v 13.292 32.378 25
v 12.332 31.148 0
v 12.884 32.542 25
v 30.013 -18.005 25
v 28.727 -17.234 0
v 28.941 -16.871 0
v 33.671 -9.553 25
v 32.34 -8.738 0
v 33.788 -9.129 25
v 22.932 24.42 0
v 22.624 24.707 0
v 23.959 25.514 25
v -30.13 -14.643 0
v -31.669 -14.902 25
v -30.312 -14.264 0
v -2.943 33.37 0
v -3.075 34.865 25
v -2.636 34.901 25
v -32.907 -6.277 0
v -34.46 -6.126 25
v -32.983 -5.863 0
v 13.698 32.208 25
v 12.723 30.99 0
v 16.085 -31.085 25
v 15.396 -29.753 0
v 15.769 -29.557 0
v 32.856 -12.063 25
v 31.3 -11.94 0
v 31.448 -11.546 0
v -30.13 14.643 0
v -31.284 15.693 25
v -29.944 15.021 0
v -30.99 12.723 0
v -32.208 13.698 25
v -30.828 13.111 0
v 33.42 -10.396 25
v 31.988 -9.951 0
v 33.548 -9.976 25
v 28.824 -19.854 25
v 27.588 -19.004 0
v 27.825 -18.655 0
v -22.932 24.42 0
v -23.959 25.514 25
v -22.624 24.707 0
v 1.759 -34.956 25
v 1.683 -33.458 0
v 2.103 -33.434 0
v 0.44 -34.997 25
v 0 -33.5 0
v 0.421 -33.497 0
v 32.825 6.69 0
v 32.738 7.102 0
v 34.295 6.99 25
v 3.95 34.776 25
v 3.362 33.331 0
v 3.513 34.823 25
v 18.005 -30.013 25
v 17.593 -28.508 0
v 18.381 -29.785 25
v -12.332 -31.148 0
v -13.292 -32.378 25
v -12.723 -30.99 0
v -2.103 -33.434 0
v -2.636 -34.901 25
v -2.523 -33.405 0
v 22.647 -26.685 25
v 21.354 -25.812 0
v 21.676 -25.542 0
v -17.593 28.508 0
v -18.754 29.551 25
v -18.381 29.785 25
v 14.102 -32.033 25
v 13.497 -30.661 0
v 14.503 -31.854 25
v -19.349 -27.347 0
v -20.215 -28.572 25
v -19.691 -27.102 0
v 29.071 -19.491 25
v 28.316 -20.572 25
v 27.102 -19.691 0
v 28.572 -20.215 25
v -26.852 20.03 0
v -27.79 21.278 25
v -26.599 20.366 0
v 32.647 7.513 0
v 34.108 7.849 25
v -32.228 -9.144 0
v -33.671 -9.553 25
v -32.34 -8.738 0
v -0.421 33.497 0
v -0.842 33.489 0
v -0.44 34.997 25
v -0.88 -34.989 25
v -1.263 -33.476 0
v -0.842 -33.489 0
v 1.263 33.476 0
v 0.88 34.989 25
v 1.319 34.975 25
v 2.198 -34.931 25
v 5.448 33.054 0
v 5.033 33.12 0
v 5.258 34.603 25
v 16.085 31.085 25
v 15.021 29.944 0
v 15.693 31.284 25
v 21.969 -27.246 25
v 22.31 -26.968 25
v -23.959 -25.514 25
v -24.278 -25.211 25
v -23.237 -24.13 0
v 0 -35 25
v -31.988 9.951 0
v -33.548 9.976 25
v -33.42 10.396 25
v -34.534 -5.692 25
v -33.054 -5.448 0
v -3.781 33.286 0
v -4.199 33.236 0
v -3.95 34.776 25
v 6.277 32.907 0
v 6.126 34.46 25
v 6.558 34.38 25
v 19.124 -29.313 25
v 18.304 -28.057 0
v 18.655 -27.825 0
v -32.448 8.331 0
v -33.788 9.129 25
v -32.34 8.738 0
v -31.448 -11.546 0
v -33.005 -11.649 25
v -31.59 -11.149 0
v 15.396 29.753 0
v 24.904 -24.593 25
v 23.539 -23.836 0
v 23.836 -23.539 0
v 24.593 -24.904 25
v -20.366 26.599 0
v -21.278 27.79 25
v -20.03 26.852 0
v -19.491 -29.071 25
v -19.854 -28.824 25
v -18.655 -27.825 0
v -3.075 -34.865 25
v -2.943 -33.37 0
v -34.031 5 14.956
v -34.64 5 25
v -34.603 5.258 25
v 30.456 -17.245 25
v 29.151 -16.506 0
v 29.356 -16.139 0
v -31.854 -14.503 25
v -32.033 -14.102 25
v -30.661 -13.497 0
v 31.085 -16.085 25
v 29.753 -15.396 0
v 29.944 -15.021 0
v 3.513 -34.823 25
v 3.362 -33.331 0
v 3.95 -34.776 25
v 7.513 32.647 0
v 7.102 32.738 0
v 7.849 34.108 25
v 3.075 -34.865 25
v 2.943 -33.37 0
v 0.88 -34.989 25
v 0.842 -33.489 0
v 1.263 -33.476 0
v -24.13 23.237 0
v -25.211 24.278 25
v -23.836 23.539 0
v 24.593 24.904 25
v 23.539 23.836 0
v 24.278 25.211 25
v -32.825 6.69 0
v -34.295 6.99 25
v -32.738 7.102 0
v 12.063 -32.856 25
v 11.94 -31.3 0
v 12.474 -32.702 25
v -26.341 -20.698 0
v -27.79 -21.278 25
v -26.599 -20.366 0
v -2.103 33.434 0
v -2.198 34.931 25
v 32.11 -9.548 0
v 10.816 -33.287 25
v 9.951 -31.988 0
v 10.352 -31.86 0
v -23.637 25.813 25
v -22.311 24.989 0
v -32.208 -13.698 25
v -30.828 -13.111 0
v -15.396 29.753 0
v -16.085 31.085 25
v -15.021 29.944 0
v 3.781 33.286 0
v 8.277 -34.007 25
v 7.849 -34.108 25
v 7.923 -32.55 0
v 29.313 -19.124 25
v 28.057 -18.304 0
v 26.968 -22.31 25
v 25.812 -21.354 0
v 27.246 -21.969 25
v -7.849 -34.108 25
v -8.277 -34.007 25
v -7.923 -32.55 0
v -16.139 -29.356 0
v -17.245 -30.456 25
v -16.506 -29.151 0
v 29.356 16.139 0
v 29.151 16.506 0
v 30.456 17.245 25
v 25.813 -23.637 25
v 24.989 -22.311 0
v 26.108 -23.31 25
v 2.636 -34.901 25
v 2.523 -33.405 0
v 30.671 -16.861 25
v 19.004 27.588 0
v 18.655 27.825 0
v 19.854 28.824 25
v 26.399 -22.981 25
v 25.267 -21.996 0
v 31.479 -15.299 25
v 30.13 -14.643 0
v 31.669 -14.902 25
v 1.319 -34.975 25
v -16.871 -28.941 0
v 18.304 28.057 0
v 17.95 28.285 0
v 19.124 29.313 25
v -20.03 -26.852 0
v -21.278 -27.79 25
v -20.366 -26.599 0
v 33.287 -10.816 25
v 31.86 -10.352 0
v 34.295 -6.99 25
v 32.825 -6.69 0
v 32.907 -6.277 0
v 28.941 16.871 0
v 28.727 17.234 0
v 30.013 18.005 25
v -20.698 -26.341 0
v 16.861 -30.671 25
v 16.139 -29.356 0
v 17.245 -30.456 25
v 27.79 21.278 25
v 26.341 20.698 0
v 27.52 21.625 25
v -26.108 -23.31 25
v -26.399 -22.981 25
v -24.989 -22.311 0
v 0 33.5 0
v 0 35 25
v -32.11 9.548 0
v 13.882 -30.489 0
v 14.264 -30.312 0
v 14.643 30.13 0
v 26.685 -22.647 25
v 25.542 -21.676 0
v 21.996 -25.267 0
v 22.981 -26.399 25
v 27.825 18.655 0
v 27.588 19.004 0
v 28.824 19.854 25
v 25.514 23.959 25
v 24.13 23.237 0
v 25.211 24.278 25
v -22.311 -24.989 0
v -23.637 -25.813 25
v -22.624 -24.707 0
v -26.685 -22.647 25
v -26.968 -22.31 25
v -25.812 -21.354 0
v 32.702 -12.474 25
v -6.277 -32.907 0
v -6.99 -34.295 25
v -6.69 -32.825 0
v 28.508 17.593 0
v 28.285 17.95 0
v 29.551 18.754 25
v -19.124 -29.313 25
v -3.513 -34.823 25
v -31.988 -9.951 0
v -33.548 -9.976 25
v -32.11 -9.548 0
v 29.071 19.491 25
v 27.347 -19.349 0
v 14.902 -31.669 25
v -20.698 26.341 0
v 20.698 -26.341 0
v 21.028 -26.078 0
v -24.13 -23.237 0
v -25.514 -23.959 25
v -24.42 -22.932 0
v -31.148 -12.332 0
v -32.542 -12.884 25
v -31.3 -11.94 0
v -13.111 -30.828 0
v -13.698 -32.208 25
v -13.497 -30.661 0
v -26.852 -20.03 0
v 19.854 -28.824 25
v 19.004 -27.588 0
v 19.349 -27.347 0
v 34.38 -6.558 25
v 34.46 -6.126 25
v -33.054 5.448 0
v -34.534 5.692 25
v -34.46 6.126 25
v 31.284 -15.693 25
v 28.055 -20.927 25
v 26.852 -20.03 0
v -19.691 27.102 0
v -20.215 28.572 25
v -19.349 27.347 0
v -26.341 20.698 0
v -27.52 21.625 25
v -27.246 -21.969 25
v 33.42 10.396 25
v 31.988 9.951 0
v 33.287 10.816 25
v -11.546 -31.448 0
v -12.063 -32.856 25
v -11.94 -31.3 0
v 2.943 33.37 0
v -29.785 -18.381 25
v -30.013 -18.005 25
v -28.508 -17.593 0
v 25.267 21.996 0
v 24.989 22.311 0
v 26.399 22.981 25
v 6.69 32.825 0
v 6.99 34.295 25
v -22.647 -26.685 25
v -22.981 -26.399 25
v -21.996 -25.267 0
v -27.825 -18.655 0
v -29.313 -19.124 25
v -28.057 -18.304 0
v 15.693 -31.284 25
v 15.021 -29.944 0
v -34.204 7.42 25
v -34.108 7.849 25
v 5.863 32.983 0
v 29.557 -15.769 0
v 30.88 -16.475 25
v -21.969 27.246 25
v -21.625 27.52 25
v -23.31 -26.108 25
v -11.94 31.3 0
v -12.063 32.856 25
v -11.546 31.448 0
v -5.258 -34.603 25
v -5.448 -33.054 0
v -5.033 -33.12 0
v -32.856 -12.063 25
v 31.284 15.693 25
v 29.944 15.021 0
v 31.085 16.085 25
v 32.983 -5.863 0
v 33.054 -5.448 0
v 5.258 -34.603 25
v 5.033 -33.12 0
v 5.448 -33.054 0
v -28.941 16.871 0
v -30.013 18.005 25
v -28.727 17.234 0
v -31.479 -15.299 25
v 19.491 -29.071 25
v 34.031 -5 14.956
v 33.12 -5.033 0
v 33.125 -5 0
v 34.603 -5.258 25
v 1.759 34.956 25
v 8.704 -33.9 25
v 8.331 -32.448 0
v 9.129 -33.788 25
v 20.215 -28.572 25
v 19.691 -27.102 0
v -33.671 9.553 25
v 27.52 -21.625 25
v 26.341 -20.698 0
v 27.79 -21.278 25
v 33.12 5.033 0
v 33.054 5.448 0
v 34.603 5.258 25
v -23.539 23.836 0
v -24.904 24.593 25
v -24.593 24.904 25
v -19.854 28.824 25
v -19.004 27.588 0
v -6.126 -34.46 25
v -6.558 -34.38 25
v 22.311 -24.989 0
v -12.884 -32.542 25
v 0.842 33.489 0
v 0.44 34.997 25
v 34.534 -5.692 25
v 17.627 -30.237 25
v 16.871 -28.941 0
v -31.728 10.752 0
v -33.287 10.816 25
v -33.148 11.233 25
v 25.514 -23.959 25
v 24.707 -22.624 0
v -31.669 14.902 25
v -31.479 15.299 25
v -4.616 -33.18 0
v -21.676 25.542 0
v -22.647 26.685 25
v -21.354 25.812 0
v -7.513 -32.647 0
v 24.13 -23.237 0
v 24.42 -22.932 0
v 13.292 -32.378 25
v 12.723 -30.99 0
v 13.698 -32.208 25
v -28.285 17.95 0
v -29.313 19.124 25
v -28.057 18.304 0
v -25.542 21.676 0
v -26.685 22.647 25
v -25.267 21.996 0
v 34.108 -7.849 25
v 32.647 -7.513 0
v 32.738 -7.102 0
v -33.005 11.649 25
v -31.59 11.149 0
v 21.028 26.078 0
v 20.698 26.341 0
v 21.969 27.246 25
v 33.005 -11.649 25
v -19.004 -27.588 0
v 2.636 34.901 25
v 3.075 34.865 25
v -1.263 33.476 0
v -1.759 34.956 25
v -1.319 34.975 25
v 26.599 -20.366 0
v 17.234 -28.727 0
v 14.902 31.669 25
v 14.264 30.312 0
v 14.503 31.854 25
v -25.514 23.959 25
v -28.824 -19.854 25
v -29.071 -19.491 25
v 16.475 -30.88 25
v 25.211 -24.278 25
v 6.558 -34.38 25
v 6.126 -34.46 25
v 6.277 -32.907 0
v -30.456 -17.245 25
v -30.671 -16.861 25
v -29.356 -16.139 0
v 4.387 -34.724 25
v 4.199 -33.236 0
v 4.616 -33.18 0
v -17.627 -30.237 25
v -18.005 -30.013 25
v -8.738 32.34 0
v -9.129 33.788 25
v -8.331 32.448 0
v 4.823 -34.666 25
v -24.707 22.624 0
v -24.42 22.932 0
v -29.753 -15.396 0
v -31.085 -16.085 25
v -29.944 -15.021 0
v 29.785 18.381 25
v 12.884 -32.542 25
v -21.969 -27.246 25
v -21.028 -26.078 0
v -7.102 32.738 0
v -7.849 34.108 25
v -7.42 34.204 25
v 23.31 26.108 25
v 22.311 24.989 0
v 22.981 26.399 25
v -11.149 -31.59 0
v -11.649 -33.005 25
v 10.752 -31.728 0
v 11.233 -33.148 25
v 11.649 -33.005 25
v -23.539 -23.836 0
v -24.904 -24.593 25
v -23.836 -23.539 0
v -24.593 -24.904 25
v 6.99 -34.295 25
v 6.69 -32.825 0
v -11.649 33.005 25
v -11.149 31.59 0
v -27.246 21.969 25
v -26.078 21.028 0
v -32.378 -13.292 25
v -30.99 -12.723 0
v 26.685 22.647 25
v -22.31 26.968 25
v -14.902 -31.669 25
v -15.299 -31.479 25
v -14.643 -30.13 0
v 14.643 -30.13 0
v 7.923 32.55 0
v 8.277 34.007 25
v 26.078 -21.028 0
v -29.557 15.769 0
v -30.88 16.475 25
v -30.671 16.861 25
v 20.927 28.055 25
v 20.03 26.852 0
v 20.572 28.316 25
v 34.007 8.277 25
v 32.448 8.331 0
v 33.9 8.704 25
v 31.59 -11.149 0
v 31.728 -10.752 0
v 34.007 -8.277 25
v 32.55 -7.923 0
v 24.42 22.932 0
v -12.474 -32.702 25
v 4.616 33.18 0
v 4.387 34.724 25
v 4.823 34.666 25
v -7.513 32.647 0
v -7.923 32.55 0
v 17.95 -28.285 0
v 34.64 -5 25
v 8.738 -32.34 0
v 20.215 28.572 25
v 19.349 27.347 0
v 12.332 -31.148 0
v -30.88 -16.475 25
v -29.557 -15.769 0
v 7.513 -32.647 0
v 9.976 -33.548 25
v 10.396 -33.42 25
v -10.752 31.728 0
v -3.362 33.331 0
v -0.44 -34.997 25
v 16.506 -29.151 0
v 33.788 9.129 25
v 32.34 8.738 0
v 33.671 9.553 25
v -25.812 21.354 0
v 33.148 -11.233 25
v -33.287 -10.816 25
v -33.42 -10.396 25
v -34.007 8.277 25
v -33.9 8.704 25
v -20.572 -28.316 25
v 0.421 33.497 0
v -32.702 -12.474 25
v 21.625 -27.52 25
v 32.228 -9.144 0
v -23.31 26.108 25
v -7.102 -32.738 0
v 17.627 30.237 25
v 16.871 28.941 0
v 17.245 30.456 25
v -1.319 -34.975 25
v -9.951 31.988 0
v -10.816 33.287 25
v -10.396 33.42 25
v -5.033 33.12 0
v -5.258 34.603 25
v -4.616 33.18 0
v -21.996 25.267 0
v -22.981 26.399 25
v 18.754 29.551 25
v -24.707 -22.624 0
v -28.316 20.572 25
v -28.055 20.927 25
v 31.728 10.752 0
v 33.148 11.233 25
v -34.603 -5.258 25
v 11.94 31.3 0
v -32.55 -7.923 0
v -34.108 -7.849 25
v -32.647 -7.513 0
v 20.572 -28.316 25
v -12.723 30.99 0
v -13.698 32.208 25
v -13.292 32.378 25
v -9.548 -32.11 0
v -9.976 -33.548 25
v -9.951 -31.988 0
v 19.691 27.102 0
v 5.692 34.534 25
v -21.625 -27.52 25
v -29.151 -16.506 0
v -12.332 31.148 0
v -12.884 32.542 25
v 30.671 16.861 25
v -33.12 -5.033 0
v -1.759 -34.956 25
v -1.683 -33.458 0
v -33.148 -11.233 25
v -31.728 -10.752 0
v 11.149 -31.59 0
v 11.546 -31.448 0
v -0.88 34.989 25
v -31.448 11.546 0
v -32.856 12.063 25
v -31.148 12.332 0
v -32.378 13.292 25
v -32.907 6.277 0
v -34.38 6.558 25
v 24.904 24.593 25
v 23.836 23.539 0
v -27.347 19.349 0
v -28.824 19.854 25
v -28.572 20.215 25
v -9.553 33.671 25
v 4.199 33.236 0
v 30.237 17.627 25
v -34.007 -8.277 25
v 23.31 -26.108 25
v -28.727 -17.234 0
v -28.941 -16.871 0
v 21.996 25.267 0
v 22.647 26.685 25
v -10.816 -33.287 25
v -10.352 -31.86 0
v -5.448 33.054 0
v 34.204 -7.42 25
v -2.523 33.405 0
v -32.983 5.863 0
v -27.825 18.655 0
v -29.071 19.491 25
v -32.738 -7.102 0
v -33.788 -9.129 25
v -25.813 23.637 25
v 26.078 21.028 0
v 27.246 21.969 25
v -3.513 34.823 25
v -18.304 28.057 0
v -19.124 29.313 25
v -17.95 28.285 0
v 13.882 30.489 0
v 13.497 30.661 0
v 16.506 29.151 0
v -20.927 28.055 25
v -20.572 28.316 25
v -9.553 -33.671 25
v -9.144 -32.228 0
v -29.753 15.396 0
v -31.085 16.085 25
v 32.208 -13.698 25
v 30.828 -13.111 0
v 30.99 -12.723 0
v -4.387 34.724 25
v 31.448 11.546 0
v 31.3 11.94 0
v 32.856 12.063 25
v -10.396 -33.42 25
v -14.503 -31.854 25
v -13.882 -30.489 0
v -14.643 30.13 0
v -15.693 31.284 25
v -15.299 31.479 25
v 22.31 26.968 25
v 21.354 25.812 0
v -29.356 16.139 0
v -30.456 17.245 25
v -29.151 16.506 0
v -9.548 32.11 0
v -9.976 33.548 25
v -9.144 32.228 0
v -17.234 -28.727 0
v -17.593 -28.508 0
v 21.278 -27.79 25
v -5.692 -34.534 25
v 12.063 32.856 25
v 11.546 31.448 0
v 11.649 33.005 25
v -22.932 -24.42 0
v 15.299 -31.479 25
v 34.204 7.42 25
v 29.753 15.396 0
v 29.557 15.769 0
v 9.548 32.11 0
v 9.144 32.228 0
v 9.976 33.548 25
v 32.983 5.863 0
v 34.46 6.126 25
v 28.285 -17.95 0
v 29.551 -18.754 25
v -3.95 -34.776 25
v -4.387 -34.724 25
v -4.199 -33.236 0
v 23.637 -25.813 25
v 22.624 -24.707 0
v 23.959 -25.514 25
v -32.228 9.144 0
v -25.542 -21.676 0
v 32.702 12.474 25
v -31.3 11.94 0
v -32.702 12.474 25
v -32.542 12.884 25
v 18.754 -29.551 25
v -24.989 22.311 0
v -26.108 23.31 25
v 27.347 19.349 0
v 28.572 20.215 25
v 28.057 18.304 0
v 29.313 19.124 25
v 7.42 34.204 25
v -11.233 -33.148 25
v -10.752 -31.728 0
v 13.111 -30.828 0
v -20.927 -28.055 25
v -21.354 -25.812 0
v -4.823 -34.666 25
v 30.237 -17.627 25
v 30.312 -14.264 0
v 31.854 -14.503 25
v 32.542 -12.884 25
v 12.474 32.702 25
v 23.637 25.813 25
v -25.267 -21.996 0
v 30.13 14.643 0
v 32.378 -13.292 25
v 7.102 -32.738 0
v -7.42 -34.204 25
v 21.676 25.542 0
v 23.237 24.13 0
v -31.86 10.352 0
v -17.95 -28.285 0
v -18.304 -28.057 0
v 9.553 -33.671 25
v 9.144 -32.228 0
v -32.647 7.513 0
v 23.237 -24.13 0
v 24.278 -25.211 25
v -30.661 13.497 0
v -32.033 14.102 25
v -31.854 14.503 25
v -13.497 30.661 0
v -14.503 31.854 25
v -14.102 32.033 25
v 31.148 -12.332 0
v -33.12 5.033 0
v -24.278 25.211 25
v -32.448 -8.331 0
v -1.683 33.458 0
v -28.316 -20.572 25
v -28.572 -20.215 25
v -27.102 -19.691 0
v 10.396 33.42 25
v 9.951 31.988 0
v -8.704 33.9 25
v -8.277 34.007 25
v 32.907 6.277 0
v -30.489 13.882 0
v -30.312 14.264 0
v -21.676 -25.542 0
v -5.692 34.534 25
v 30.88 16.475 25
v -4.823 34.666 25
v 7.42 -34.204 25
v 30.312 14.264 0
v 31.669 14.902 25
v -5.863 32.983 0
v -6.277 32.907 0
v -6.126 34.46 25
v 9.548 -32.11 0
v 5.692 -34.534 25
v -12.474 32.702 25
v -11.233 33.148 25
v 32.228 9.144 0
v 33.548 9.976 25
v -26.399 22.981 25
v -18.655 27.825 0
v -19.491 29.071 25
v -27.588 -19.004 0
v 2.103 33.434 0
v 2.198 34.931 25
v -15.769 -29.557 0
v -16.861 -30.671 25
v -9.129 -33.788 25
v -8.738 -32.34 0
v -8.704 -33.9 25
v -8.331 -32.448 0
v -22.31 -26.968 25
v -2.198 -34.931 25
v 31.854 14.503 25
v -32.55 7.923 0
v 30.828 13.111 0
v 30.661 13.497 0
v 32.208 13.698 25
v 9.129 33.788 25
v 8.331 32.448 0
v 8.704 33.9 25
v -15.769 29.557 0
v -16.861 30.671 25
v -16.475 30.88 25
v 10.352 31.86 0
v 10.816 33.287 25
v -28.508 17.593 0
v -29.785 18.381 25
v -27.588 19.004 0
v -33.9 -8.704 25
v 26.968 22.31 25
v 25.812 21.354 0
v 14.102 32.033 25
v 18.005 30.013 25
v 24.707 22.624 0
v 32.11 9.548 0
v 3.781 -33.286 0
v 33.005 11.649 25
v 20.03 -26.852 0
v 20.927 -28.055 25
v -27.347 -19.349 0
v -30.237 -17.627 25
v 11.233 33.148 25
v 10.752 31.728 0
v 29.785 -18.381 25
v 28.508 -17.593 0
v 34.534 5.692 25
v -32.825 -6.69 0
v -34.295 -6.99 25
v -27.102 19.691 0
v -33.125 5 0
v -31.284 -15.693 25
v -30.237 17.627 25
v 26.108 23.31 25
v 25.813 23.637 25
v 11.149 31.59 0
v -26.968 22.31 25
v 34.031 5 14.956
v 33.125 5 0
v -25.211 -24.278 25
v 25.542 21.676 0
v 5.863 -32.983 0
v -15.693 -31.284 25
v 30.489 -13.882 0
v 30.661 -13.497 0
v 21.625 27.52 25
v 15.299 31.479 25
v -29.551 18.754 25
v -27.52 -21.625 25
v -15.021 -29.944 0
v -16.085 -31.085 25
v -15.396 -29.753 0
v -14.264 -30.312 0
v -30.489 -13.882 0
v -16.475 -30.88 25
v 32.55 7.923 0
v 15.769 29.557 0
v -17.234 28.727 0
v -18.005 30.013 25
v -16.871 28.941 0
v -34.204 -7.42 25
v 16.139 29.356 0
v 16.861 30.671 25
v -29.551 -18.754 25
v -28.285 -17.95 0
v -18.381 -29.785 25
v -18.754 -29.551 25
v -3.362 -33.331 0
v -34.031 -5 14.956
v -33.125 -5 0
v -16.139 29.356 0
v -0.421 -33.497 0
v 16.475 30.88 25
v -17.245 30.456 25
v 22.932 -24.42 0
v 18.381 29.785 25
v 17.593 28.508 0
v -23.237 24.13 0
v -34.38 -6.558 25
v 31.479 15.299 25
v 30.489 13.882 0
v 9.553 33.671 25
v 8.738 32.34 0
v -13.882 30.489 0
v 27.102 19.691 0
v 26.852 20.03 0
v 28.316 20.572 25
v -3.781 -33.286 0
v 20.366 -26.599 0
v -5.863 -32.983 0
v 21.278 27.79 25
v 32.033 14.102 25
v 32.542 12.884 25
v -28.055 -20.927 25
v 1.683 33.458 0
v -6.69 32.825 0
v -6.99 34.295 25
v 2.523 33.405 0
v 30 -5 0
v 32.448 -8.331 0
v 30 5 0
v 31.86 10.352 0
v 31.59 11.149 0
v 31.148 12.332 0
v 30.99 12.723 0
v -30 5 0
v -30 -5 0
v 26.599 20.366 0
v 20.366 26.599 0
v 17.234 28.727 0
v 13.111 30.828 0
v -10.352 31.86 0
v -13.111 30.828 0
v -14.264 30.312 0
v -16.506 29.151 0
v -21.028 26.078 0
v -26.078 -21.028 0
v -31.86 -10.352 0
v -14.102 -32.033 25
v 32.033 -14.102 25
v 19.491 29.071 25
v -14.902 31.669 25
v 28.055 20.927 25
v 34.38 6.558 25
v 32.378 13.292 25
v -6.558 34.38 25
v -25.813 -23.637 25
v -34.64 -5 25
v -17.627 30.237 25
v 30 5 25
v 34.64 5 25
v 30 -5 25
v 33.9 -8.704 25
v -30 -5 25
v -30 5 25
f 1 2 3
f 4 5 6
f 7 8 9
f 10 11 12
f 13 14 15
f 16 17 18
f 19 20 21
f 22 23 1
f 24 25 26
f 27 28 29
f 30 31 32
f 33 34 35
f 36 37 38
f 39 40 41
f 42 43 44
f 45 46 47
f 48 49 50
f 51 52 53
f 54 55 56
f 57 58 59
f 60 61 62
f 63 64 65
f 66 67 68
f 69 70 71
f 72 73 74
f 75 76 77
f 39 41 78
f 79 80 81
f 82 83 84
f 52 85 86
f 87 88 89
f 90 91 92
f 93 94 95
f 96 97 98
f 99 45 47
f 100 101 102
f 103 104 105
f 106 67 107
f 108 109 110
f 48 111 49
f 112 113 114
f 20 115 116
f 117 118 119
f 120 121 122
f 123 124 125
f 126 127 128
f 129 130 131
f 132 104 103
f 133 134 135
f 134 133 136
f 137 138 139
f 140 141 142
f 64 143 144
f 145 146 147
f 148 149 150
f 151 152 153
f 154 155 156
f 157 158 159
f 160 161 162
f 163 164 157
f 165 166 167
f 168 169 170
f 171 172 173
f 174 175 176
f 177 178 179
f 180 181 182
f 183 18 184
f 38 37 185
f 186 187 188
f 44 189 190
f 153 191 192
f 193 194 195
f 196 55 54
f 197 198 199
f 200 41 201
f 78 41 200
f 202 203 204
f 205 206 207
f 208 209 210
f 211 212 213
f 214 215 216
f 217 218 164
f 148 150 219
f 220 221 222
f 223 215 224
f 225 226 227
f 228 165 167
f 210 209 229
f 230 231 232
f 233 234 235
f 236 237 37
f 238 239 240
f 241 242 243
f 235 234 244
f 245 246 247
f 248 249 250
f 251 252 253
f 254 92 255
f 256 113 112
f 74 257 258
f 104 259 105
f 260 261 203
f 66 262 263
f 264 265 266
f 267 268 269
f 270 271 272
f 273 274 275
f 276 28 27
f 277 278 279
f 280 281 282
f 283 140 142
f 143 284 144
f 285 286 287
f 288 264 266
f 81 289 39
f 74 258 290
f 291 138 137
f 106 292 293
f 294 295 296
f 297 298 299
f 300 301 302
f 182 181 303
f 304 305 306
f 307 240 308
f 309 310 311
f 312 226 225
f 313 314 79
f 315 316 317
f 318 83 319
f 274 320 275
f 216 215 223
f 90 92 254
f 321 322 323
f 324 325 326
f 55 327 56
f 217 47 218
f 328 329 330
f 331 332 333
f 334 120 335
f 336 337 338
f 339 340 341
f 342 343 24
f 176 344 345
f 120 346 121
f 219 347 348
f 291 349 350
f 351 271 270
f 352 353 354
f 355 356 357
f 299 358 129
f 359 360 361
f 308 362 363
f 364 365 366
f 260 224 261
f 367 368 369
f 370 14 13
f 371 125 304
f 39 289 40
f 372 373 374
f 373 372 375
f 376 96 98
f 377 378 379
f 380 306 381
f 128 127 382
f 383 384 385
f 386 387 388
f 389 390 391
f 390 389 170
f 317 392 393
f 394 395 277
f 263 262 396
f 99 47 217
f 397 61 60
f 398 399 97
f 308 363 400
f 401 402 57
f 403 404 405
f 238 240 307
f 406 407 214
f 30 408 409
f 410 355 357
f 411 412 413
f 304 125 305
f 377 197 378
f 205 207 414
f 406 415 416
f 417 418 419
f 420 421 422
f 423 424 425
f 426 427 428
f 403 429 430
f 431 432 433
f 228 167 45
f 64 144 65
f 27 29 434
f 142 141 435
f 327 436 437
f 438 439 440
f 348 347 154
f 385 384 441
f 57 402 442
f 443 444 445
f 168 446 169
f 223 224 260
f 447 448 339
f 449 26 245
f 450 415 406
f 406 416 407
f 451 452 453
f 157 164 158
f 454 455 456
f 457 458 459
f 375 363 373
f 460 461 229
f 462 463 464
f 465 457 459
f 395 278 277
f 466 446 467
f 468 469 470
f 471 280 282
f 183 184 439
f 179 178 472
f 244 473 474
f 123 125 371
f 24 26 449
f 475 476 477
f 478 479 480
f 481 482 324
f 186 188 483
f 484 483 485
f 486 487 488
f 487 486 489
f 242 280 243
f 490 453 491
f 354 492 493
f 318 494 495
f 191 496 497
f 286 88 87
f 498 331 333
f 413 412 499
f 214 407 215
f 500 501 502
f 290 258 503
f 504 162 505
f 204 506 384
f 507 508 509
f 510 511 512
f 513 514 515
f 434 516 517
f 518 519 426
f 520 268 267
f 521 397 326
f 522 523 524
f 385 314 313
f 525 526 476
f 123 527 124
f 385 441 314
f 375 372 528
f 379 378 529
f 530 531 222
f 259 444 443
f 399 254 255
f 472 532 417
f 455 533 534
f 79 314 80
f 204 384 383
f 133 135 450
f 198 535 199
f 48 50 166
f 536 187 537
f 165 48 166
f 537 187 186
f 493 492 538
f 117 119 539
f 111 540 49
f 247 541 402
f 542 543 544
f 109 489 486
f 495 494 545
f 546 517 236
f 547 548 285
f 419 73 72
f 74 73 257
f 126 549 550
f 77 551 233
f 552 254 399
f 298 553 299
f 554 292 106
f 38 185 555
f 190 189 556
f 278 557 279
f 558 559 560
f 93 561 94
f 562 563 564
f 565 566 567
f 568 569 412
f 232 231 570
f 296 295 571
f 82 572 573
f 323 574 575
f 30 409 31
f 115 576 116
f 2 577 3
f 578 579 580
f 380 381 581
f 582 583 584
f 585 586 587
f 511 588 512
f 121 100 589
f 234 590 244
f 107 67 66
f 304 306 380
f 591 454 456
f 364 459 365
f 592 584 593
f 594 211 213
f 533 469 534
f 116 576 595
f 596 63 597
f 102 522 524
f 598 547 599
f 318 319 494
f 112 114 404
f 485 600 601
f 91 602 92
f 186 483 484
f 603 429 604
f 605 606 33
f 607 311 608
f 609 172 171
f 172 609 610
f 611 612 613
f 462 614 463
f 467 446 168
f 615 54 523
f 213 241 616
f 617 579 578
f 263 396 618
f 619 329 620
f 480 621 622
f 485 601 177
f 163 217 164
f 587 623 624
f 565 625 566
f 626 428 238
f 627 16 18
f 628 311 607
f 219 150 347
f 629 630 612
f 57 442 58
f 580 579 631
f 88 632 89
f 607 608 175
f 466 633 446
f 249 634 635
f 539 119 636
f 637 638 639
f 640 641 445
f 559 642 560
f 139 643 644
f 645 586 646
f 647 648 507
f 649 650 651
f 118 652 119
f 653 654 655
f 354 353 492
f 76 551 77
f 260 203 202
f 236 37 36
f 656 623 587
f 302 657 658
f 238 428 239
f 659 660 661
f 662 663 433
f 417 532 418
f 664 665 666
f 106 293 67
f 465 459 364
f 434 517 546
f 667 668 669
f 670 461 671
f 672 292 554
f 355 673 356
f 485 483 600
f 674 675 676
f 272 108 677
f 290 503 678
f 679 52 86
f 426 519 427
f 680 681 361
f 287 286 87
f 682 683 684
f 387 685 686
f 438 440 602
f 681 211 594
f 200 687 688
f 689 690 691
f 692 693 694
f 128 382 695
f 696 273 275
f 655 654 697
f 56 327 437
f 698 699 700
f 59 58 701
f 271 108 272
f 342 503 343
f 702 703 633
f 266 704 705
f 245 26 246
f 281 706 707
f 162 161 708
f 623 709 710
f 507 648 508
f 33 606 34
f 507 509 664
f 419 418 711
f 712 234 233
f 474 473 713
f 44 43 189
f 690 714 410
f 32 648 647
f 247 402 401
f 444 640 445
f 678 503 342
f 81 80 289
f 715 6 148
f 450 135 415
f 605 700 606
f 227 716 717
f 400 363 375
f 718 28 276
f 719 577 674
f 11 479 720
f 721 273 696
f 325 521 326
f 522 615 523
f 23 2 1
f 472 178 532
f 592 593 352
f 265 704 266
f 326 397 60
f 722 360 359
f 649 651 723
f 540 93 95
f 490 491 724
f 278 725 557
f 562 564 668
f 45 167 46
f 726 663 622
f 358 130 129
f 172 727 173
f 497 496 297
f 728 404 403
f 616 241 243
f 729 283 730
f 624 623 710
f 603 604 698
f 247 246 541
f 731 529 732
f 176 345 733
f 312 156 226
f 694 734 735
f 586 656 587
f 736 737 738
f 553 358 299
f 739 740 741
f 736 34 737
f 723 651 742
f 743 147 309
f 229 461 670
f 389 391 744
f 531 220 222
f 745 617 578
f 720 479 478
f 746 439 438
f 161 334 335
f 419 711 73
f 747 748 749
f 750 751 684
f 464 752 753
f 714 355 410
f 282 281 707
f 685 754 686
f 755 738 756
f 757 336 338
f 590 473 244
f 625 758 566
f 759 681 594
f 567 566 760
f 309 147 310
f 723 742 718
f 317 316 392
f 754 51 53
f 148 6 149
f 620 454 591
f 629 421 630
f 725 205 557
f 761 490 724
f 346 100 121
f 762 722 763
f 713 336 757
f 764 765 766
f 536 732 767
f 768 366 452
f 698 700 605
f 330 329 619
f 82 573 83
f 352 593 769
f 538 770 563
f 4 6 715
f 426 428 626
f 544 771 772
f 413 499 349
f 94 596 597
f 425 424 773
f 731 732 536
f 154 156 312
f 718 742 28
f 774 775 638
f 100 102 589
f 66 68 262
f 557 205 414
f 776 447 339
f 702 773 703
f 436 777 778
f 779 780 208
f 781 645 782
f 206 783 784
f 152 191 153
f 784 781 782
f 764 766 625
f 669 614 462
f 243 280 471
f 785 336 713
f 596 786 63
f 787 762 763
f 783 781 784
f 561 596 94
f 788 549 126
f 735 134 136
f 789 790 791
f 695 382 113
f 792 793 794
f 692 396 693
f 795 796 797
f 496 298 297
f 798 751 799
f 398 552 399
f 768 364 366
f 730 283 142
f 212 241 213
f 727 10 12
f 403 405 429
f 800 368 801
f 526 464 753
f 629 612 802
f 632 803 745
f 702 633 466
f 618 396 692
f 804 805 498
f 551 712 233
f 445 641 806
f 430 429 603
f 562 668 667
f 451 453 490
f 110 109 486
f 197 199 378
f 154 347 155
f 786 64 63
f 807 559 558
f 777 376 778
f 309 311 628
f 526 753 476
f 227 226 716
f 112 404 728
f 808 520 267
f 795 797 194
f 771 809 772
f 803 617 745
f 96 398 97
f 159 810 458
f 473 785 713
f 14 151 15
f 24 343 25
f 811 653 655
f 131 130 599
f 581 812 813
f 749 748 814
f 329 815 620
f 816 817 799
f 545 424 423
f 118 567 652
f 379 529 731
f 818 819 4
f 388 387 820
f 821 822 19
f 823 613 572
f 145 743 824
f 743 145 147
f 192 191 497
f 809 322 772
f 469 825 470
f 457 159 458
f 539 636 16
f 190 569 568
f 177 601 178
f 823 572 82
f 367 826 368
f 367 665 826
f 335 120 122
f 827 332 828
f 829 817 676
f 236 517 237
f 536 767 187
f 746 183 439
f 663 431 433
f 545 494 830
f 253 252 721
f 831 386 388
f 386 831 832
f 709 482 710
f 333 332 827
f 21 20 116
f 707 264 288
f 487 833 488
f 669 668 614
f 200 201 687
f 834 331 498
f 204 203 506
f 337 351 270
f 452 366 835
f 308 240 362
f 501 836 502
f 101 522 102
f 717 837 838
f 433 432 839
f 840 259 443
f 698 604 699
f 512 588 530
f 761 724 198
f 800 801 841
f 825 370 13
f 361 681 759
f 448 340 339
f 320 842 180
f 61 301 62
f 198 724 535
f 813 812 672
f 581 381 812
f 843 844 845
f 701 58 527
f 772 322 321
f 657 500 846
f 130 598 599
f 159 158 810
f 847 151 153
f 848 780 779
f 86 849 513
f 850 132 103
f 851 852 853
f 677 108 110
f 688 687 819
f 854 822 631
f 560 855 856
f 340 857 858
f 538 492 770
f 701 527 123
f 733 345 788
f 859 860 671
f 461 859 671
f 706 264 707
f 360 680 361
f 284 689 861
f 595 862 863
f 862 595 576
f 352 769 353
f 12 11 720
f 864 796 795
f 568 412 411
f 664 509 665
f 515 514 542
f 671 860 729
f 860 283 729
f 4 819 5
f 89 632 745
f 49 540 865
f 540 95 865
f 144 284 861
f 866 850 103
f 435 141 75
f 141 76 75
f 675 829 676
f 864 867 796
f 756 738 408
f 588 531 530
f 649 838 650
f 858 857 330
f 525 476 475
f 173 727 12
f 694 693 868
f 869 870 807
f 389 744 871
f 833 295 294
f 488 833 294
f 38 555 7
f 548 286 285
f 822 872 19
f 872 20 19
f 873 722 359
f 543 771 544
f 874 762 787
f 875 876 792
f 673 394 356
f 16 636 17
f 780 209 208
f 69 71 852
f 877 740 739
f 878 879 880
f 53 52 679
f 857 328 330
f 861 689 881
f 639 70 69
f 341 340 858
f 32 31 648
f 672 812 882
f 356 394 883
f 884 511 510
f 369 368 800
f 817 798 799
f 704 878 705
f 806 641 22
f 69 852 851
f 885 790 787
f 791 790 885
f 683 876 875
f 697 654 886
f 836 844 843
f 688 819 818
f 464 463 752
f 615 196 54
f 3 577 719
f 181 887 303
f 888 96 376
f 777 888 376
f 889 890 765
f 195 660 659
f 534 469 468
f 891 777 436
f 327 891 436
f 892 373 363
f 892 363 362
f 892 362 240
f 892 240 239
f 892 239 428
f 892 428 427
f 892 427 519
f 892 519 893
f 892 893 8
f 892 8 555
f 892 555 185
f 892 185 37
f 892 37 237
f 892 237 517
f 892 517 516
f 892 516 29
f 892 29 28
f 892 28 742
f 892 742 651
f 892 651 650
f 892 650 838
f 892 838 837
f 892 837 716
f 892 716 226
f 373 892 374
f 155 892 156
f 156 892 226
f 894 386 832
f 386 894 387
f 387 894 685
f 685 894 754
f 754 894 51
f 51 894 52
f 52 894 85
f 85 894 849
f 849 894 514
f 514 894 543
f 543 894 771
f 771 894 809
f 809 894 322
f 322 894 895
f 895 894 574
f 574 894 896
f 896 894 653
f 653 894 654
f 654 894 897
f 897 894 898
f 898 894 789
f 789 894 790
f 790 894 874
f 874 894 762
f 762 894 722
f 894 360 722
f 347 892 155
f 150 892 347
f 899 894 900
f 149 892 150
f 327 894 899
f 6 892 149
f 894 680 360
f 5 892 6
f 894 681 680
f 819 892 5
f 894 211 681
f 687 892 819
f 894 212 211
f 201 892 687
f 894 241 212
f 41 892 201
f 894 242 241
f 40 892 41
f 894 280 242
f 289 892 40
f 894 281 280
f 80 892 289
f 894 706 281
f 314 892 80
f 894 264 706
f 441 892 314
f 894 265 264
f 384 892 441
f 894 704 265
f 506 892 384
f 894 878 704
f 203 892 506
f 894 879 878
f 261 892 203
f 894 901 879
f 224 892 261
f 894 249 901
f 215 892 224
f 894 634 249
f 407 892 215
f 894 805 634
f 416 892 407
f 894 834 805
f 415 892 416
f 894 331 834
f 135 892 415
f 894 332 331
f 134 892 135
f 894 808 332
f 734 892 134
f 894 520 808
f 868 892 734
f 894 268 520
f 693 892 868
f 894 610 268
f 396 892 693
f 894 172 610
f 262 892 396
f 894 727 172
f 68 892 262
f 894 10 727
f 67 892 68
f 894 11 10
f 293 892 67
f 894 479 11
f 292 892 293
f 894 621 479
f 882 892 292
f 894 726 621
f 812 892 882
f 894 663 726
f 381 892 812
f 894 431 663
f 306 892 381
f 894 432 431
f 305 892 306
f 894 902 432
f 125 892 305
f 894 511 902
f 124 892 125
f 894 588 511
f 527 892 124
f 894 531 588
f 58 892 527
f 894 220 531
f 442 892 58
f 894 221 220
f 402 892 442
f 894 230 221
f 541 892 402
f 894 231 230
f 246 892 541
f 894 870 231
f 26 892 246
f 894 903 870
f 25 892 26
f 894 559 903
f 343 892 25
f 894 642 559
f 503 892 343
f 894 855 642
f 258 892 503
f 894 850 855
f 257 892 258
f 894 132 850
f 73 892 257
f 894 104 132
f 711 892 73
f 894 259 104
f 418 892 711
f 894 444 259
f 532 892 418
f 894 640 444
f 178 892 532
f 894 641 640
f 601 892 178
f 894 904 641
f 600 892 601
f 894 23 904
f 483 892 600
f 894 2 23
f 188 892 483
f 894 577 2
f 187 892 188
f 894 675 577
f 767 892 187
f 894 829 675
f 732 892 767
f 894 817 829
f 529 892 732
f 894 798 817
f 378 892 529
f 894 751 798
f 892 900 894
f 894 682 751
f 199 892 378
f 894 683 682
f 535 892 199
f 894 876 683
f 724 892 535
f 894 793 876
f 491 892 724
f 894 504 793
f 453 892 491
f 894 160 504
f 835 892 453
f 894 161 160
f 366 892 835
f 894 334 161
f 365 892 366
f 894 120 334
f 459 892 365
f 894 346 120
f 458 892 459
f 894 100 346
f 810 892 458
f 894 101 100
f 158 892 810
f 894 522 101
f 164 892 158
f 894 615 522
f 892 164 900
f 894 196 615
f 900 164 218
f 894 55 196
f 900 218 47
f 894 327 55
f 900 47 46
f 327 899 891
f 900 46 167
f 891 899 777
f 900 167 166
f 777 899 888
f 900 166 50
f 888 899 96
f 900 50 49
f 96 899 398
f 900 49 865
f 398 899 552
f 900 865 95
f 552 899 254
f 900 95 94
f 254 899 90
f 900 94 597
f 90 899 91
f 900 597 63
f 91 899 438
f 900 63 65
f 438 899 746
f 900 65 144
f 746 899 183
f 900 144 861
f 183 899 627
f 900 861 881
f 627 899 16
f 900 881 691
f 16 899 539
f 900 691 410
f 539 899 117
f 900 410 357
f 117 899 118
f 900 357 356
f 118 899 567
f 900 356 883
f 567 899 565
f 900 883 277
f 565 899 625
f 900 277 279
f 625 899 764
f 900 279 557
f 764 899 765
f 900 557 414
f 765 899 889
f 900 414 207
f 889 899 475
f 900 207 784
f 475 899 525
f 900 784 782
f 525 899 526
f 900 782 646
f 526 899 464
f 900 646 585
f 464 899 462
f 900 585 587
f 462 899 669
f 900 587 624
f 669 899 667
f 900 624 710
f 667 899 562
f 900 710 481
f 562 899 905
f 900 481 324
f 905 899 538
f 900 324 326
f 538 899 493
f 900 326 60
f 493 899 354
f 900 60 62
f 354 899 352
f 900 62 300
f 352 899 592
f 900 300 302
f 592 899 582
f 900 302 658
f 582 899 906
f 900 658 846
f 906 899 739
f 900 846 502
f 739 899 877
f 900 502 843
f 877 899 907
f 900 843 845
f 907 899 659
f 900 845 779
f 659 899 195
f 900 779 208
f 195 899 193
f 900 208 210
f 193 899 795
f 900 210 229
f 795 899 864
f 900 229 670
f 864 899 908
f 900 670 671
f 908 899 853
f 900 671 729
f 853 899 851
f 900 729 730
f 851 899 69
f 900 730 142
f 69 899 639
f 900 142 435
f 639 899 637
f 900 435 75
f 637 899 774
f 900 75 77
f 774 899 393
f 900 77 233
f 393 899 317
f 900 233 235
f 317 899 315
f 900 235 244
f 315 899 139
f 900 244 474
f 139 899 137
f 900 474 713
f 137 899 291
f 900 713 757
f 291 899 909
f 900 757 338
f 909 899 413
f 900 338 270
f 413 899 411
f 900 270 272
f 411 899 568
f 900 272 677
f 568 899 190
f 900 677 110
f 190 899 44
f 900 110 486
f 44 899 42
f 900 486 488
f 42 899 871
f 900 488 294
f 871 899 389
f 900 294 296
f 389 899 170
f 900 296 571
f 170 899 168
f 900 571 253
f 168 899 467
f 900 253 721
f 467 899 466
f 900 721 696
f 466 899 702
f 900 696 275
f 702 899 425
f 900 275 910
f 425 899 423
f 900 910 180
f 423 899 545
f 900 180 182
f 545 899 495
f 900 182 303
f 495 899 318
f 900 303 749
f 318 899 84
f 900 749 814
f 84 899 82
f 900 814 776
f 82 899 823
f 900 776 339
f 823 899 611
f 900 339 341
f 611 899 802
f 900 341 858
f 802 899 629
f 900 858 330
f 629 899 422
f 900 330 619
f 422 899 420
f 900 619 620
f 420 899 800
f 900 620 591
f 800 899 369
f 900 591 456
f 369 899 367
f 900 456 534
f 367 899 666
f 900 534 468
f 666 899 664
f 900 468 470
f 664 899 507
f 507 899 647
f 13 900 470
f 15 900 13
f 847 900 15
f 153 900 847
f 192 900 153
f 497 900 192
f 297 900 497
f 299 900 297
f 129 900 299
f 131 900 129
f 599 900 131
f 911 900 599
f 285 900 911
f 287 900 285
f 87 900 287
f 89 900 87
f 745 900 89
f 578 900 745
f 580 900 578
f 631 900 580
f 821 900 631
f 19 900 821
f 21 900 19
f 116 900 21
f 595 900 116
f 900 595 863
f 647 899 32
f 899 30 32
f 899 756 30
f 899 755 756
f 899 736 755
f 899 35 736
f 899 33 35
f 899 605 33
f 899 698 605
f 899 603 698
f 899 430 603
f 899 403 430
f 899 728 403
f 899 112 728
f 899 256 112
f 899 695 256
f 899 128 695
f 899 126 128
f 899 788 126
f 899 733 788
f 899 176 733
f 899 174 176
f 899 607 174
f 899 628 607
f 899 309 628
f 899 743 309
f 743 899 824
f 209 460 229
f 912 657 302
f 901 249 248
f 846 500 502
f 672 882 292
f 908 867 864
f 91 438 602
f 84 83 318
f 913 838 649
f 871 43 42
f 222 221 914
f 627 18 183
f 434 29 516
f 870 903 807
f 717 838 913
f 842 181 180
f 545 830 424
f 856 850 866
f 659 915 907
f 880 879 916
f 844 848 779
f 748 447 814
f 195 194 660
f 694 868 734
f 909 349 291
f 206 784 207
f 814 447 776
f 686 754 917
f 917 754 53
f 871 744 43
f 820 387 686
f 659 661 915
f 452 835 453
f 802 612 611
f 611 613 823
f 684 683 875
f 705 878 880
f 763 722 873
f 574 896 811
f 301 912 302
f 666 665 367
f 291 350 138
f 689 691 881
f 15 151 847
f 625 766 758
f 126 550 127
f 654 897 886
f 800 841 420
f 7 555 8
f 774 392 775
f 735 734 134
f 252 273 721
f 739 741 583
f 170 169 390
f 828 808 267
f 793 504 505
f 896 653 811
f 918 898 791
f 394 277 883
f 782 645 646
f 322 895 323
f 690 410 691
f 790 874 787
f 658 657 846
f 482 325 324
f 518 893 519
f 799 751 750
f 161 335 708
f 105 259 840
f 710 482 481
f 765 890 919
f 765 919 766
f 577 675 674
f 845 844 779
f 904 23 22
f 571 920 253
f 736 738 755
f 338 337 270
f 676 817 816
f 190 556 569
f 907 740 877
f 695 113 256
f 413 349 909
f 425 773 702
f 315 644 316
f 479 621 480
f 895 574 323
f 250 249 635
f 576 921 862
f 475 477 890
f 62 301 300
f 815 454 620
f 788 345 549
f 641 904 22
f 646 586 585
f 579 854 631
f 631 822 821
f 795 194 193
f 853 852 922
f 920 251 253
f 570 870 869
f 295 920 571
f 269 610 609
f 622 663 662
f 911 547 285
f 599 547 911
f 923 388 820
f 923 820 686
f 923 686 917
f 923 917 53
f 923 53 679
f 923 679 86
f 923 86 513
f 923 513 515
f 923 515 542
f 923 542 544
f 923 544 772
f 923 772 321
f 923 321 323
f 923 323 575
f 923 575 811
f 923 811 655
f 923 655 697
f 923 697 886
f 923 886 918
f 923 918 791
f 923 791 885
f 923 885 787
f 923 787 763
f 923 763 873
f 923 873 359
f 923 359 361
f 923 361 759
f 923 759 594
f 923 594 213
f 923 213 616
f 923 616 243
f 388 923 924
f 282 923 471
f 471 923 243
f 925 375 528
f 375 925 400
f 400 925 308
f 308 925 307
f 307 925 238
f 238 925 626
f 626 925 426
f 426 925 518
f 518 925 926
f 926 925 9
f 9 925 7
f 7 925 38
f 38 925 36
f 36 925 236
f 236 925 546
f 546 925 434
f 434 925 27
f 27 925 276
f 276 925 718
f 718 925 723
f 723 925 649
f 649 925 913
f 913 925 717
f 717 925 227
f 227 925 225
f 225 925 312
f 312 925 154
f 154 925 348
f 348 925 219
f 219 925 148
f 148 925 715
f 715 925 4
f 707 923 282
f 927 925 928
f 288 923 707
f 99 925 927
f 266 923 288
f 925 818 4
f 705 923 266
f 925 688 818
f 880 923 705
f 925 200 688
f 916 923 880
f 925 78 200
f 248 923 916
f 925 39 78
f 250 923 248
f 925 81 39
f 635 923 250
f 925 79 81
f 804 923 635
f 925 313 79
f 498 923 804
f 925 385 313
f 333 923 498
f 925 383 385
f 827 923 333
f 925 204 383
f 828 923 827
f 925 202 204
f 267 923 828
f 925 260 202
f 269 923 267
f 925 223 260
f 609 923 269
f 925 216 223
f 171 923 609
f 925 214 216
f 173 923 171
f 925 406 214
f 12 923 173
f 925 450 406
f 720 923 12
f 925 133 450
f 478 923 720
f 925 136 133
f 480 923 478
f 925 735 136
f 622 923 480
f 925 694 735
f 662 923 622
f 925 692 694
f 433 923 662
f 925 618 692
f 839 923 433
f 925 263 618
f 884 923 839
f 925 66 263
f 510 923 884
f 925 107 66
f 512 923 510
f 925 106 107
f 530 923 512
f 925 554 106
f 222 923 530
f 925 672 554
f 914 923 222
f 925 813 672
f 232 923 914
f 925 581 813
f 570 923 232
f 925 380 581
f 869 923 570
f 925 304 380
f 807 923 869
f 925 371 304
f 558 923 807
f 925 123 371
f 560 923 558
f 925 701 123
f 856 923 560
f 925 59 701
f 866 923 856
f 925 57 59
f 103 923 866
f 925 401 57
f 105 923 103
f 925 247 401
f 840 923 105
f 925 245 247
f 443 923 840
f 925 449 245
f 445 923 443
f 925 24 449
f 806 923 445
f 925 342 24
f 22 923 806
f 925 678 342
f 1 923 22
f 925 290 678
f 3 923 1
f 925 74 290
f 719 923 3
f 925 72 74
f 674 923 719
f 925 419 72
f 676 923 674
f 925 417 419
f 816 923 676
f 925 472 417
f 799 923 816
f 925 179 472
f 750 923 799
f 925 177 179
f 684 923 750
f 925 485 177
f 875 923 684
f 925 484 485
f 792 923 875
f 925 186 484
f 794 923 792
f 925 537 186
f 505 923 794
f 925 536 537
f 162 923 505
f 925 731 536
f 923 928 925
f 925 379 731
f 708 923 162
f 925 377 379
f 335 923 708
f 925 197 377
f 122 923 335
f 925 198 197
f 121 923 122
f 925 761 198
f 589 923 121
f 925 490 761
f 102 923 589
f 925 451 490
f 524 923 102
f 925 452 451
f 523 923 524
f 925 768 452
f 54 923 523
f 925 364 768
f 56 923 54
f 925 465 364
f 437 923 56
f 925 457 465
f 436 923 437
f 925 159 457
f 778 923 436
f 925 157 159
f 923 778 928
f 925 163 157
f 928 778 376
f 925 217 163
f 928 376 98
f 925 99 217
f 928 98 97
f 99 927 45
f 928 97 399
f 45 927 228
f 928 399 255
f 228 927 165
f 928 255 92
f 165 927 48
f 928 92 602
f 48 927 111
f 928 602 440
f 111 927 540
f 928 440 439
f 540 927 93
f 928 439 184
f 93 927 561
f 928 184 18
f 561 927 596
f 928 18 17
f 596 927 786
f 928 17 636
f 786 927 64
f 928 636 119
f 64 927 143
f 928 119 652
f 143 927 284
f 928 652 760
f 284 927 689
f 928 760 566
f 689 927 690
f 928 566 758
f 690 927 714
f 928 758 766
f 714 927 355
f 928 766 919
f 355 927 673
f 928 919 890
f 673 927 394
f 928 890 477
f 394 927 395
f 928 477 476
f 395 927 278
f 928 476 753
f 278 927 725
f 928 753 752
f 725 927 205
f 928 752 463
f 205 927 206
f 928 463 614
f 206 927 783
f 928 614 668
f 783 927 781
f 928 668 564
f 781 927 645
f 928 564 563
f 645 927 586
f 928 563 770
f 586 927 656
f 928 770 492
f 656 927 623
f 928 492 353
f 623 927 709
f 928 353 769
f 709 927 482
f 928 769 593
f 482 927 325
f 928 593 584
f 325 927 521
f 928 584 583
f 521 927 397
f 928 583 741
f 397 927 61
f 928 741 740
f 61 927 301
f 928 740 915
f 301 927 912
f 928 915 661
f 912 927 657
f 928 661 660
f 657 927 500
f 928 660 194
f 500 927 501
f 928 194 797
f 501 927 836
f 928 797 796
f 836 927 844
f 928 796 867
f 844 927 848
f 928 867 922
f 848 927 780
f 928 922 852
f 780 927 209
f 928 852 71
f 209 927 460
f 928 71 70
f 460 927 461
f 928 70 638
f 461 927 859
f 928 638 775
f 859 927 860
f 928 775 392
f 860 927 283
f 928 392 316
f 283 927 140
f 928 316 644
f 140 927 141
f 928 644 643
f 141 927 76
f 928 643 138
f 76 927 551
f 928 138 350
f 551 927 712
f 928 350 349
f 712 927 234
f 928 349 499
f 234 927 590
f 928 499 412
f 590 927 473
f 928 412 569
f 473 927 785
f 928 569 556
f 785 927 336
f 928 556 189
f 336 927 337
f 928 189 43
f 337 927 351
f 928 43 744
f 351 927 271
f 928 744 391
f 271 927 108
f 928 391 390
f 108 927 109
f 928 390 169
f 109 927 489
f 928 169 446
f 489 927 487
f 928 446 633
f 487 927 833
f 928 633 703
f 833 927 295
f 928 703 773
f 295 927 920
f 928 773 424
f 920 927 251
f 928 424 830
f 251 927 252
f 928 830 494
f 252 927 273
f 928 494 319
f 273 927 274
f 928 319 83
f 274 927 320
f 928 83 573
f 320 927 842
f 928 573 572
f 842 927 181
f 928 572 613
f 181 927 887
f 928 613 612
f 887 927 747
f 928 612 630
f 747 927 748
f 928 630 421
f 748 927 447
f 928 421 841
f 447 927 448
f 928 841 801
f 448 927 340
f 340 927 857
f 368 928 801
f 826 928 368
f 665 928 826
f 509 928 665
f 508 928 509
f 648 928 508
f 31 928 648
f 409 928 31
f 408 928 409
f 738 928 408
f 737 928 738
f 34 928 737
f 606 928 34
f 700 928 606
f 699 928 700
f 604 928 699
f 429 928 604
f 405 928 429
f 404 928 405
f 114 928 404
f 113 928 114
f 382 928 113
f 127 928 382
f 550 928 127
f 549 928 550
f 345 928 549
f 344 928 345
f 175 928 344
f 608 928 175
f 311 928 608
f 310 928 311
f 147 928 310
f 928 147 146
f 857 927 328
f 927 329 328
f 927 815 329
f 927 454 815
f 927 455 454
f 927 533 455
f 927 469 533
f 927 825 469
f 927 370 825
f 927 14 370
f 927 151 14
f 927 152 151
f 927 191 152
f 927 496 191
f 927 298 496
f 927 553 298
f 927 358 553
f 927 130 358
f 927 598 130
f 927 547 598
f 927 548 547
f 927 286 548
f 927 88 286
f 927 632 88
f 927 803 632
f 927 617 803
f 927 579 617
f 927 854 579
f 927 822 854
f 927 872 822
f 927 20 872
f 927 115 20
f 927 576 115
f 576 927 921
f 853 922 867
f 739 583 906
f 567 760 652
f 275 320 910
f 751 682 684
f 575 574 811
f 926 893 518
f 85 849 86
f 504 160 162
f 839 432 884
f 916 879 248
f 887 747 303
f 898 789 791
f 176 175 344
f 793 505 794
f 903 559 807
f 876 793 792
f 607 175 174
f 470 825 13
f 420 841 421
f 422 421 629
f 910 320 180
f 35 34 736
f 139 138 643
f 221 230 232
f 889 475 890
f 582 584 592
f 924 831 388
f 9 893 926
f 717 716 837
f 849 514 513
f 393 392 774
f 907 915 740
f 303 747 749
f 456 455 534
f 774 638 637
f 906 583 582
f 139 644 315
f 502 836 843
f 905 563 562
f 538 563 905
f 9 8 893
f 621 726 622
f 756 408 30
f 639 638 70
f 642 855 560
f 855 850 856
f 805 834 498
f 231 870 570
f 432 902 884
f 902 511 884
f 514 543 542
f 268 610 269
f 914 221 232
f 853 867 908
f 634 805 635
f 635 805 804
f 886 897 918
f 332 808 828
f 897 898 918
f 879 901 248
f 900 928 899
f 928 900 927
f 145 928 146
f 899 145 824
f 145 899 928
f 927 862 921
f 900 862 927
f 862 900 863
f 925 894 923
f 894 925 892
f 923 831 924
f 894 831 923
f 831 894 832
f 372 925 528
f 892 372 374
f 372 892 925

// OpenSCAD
// file: params.scad
d_up_cup_holder = 70;
d_down_cup_holder = 67;
h_cup_holder = 25;

x_support = 5;
y_support = 10;
// main file
include <params.scad>;

difference()
{
    cylinder(h=h_cup_holder, d1=d_down_cup_holder, d2=d_up_cup_holder, $fn=500);

    translate([d_up_cup_holder / -2, y_support / -2, -1])
    {
        cube([x_support, y_support, h_cup_holder + 2]);
    }

    translate([d_up_cup_holder / 2 - x_support, y_support / -2, -1])
    {
        cube([x_support, y_support, h_cup_holder + 2]);
    }
}
